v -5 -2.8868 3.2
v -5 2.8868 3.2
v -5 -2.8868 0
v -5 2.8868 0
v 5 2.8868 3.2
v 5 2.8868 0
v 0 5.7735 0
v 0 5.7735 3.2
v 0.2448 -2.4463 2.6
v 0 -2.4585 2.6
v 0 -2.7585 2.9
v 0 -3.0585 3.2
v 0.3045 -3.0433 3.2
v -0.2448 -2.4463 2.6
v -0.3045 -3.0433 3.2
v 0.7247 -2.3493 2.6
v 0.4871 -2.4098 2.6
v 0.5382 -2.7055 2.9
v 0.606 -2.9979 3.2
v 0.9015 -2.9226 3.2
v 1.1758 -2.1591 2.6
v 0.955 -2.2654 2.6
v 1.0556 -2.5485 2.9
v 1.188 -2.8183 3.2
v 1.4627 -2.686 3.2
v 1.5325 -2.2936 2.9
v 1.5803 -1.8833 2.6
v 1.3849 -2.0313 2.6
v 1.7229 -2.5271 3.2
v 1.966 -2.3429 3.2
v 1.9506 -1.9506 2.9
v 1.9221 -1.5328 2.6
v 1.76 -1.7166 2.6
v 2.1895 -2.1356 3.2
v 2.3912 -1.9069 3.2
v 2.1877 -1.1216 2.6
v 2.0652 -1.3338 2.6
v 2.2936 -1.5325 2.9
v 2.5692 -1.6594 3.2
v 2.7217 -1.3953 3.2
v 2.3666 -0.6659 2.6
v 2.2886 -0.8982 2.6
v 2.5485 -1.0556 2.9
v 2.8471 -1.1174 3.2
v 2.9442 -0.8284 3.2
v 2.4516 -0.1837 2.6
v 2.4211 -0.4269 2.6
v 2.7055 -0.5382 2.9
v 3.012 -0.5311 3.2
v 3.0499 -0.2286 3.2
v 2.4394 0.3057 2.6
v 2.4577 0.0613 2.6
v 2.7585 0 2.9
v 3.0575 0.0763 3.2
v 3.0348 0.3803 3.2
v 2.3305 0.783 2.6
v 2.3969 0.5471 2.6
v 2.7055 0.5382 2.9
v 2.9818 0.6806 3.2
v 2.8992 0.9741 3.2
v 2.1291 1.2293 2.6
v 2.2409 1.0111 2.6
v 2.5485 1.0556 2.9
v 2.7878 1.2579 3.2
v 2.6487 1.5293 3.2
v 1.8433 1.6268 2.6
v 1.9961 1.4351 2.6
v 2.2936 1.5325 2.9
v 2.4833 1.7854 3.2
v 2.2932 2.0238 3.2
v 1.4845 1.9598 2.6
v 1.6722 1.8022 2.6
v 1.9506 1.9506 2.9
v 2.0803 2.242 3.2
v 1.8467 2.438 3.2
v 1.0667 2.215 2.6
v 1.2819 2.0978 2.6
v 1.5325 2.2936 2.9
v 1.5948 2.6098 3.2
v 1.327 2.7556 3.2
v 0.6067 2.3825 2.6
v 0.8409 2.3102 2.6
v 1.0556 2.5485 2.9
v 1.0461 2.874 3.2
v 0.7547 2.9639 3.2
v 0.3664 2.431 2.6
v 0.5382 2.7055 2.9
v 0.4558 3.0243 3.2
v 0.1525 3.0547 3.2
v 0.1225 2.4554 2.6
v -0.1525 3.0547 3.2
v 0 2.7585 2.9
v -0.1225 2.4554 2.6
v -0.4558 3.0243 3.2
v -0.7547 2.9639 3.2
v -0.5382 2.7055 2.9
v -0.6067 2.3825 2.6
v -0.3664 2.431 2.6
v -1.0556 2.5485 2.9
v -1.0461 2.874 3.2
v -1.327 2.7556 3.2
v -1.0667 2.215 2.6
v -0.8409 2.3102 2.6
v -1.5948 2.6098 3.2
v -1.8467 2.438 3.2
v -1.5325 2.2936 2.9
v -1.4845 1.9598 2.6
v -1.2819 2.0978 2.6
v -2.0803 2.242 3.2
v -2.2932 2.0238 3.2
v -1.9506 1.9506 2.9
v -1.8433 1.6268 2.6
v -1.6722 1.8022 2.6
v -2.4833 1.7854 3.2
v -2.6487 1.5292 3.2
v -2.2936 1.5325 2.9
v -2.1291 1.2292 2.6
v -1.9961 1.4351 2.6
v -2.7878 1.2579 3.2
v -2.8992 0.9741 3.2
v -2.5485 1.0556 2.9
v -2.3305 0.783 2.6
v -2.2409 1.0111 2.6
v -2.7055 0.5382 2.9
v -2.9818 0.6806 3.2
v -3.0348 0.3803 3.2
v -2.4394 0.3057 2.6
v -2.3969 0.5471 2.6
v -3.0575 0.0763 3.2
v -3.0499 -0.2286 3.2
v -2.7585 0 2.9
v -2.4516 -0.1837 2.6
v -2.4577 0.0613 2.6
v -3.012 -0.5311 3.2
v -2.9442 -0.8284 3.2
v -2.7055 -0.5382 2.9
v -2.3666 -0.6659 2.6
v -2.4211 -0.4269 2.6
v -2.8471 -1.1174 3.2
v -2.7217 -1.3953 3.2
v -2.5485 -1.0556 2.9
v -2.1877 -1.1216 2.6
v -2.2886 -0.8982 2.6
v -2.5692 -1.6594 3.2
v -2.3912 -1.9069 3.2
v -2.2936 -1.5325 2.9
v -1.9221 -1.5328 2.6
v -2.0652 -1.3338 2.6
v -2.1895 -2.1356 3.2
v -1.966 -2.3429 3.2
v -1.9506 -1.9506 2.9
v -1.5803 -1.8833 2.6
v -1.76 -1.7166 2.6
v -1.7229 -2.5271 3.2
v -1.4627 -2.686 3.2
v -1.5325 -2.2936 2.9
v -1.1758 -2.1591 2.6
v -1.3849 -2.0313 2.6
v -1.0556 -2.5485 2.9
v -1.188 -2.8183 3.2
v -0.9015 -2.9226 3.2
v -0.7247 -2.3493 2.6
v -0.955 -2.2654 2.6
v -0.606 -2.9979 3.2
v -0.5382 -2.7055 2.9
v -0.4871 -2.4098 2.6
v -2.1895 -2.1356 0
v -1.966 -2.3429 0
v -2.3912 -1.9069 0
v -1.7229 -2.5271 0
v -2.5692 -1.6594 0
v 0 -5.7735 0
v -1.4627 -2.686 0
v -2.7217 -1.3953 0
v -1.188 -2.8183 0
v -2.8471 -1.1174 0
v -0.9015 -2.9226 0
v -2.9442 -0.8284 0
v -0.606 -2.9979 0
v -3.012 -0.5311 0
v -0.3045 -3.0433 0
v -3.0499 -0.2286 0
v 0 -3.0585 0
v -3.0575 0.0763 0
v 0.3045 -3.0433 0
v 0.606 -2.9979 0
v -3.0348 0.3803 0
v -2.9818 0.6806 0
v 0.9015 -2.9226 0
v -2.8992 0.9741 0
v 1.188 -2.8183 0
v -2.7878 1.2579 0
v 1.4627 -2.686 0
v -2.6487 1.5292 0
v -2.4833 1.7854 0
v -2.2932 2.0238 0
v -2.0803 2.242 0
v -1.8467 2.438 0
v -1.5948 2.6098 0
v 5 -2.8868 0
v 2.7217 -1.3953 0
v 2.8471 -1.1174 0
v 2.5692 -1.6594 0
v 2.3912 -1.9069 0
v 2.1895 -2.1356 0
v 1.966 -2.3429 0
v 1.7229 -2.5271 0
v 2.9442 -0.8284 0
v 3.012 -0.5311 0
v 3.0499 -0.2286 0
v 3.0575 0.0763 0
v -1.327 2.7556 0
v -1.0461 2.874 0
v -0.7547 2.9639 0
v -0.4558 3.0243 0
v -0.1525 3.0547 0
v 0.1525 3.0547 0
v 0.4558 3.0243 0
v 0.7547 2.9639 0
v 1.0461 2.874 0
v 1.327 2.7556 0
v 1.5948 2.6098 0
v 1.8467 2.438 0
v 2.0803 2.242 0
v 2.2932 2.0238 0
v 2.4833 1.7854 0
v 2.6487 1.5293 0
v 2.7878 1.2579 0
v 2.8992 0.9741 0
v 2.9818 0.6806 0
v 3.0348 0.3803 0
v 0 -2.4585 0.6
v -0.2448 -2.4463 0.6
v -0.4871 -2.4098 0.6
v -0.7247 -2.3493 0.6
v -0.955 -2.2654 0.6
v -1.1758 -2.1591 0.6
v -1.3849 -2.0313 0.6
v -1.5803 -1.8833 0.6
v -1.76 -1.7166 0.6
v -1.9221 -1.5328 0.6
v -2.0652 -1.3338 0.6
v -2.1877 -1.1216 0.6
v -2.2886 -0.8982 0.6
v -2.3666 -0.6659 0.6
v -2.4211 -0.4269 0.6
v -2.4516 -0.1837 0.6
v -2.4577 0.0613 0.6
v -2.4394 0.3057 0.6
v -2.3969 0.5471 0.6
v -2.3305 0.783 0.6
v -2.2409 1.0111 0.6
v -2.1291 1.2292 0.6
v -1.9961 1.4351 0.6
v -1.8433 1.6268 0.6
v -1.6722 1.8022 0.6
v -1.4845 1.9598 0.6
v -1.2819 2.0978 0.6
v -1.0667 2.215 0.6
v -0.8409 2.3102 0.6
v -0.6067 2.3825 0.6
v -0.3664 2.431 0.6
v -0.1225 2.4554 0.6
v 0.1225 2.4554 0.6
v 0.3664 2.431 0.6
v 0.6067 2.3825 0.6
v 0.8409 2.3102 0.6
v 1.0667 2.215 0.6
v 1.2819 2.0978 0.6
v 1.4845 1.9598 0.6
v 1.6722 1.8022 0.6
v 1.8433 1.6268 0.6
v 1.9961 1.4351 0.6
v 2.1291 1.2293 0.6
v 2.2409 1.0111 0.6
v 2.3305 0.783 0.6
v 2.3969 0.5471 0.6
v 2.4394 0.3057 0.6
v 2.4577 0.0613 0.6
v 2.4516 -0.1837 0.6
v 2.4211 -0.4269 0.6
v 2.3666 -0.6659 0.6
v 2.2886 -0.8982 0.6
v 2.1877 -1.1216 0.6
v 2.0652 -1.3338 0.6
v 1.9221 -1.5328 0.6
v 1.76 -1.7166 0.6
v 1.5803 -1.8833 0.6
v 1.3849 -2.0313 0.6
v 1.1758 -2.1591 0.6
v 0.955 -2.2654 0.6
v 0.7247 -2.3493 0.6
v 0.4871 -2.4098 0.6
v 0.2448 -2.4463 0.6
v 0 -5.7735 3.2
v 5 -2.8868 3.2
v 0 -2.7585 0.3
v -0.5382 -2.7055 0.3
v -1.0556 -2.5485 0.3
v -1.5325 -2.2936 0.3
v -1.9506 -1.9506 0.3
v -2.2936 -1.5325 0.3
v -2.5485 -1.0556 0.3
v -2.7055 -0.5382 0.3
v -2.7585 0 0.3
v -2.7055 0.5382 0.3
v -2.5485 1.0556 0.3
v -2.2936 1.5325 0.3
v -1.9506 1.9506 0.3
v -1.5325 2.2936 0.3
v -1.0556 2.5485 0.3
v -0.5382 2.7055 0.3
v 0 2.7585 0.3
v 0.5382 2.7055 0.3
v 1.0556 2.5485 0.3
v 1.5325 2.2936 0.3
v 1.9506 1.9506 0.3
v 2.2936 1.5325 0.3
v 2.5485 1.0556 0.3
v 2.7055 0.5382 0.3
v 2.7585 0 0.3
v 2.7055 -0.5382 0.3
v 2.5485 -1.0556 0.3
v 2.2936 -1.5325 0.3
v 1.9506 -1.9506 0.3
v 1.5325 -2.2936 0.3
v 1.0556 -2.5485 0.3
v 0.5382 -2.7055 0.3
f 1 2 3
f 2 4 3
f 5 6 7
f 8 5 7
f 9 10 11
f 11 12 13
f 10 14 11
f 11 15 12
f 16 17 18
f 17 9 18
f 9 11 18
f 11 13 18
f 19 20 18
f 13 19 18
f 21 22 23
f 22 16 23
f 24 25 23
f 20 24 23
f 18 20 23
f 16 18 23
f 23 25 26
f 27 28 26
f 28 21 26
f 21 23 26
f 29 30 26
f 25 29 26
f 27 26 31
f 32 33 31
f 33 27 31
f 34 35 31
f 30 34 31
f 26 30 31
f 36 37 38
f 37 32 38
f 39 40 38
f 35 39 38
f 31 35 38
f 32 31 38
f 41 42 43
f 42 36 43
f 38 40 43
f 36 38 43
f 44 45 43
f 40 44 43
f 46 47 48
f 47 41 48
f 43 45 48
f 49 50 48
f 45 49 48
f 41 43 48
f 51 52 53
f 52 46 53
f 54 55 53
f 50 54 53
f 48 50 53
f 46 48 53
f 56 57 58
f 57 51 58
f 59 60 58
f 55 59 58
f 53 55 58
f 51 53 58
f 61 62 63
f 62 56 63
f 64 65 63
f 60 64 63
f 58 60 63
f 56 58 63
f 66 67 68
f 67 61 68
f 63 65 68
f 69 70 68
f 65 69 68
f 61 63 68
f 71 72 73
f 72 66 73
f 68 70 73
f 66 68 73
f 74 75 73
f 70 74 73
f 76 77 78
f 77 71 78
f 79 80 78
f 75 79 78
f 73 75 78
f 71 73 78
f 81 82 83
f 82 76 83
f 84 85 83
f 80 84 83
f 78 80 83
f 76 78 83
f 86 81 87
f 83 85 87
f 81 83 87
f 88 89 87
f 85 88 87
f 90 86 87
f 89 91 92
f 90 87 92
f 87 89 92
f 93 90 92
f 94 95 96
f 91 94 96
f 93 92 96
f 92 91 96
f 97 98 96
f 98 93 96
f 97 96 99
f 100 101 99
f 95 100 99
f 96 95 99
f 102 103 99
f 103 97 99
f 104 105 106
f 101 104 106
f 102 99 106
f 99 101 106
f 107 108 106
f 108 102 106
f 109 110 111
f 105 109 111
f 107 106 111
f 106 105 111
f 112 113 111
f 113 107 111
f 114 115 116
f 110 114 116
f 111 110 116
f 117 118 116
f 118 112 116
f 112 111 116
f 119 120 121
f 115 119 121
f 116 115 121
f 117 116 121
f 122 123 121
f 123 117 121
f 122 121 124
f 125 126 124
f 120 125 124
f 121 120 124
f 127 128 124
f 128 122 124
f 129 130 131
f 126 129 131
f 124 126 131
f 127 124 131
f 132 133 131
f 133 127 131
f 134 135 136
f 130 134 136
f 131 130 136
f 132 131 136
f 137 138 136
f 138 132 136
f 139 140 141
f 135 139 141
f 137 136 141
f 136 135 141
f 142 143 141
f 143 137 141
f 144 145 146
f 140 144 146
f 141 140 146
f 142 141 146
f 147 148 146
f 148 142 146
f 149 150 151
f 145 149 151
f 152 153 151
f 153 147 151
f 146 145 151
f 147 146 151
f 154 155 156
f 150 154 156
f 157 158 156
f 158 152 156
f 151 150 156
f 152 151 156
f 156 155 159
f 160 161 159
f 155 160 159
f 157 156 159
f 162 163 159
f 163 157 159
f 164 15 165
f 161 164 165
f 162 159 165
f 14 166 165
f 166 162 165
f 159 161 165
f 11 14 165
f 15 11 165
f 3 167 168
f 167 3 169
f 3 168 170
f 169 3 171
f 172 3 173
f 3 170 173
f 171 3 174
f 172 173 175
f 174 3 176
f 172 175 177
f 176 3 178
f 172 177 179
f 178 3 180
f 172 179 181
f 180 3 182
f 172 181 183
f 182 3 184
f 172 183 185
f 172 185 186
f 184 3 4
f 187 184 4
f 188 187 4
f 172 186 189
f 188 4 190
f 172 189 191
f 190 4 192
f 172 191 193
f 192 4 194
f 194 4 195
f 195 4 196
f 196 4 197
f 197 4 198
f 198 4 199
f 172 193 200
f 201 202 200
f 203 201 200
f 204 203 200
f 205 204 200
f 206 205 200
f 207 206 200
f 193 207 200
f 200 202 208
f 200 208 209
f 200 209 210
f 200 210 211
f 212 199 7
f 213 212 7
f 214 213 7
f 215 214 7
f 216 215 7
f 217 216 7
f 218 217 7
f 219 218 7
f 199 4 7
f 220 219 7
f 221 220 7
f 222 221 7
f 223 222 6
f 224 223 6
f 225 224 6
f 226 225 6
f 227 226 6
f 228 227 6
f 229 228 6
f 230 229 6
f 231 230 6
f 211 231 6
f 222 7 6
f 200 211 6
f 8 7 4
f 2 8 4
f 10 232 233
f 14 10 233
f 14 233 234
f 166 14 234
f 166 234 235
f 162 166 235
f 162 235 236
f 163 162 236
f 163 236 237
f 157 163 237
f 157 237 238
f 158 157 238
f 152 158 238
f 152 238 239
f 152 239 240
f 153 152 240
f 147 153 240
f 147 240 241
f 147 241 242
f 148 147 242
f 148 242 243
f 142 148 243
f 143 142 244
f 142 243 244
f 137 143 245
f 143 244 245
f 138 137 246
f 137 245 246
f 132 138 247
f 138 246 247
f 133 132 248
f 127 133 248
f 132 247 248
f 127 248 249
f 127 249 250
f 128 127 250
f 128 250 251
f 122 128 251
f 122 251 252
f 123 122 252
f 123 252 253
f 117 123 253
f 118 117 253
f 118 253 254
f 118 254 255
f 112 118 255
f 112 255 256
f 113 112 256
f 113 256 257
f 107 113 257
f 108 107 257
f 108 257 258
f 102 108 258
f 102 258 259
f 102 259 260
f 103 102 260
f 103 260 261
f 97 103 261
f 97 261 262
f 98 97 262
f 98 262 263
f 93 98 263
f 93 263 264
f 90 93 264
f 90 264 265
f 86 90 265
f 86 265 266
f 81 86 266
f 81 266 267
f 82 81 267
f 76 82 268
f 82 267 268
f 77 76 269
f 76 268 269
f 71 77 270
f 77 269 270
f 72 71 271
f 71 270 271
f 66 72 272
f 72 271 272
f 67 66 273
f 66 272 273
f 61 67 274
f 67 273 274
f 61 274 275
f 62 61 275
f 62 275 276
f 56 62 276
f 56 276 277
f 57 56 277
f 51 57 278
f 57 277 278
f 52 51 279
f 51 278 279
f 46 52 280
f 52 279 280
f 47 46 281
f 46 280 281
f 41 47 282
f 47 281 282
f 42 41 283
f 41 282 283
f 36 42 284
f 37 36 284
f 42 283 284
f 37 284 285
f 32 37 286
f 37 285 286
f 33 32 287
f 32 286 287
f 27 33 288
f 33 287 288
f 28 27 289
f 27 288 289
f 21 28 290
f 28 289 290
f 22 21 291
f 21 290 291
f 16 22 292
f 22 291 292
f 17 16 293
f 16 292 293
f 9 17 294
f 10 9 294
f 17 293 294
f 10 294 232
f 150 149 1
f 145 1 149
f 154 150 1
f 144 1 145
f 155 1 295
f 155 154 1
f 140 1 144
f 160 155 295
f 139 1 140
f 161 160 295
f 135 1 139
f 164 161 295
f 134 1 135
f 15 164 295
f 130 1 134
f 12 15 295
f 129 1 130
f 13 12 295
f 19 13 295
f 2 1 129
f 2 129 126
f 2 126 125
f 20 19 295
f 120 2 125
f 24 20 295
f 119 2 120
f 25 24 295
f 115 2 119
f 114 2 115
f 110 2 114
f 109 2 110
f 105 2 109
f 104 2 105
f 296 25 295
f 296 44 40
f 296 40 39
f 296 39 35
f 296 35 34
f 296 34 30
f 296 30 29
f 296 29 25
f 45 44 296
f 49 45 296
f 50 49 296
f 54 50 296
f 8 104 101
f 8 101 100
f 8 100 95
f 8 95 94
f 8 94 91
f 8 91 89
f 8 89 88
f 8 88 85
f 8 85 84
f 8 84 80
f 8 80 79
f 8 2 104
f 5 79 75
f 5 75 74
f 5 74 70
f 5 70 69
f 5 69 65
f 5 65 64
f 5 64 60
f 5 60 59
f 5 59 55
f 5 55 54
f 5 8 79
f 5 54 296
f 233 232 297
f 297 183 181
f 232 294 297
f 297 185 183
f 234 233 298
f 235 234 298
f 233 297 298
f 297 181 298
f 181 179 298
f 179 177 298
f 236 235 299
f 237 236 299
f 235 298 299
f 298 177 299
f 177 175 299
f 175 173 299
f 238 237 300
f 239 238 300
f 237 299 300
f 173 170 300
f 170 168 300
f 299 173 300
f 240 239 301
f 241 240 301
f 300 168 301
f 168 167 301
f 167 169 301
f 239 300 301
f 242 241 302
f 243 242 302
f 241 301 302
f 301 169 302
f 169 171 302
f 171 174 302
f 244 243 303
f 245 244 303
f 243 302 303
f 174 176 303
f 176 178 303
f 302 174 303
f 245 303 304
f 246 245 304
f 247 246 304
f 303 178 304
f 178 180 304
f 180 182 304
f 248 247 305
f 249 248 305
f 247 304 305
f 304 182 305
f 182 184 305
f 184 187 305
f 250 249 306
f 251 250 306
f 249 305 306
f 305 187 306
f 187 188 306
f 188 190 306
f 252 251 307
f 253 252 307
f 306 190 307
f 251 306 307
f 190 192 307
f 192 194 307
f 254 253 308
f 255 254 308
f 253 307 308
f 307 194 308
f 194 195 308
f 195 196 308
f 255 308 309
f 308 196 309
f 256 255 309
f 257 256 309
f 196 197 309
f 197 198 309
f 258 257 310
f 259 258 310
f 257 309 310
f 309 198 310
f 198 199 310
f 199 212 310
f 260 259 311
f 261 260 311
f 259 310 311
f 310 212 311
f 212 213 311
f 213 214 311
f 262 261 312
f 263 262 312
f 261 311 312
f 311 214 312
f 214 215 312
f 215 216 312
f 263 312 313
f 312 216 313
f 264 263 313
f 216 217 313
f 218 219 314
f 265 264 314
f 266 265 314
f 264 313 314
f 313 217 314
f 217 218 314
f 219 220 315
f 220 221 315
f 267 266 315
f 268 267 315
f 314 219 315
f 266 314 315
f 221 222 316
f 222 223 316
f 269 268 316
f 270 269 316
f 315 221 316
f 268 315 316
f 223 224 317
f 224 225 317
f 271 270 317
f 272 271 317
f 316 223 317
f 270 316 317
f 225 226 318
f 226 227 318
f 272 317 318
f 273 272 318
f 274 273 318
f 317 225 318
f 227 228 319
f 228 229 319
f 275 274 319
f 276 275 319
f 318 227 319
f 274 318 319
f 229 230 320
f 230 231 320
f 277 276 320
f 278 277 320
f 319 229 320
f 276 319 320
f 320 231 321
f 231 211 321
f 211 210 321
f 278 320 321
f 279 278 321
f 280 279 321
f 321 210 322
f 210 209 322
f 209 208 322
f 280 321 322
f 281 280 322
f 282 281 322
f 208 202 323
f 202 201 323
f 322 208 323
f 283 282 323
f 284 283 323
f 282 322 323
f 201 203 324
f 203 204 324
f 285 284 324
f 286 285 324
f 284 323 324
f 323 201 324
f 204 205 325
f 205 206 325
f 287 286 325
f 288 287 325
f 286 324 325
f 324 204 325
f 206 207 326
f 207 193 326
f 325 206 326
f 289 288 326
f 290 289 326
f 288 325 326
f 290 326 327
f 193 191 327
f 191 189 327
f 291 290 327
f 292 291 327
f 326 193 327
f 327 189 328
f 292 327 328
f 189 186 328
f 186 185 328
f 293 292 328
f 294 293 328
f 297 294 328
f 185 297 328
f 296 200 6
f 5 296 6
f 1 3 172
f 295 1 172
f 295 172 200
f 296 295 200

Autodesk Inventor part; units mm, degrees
sketch "Sketch1" plane through (0, 0, 0) normal (0, 0, 1) x (1, 0, 0)
  circle A0 centre (0, 0) radius 5 construction
  line L0 (-5, 2.8868) -> (-5, -2.8868)
  line L1 (-5, -2.8868) -> (0, -5.7735)
  line L2 (0, -5.7735) -> (5, -2.8868)
  line L3 (5, -2.8868) -> (5, 2.8868)
  line L4 (5, 2.8868) -> (0, 5.7735)
  line L5 (0, 5.7735) -> (-5, 2.8868)
  line L6 (0, 8.0829) -> (0, -8.0829) projected
  line L7 (-7, 0) -> (7, 0) projected
  point P0 (0, 0)
  dimension "ParS" = 10
extrude "Extrusion1" add sketch "Sketch1" along normal blind 3.2
sketch "Sketch2" plane through (0, 0, 3.2) normal (0, 0, 1) x (1, 0, 0)
  point P0 (0, 0)
  point P1 (0, 0)
hole "Hole1" at (0, 0, 3.2) direction (0, 0, -1) diameter 4.917 end through all thread size "M6x1" class "6H" standard "ISO Metric profile"
ref_plane "MSC_PT1" through (0, 0, 3.2) normal (0, 0, 1) x (1, 0, 0)
ref_plane "MSC_PT2" through (0, 0, 0) normal (0, 0, -1) x (-1, 0, 0)
ref_plane "MSC_PF1" through (0, 0, 0) normal (1, 0, 0) x (0, 1, 0)
chamfer "Chamfer1" distance 0.6 angle 45 2 edges at (0, 2.4585, 3.2) (0, 2.4585, 0)
equation "\"d17\" = 0.6 * PTC"
equation "\"d18\" = 0.6 * PTC"
equation "\"d4\" = M"
equation "\"PTC\" = 1"
equation "\"NND\" = 6"
equation "\"THREADDIA\" = NND"
properties part number "ISO 4036 - M6" material "Steel"
